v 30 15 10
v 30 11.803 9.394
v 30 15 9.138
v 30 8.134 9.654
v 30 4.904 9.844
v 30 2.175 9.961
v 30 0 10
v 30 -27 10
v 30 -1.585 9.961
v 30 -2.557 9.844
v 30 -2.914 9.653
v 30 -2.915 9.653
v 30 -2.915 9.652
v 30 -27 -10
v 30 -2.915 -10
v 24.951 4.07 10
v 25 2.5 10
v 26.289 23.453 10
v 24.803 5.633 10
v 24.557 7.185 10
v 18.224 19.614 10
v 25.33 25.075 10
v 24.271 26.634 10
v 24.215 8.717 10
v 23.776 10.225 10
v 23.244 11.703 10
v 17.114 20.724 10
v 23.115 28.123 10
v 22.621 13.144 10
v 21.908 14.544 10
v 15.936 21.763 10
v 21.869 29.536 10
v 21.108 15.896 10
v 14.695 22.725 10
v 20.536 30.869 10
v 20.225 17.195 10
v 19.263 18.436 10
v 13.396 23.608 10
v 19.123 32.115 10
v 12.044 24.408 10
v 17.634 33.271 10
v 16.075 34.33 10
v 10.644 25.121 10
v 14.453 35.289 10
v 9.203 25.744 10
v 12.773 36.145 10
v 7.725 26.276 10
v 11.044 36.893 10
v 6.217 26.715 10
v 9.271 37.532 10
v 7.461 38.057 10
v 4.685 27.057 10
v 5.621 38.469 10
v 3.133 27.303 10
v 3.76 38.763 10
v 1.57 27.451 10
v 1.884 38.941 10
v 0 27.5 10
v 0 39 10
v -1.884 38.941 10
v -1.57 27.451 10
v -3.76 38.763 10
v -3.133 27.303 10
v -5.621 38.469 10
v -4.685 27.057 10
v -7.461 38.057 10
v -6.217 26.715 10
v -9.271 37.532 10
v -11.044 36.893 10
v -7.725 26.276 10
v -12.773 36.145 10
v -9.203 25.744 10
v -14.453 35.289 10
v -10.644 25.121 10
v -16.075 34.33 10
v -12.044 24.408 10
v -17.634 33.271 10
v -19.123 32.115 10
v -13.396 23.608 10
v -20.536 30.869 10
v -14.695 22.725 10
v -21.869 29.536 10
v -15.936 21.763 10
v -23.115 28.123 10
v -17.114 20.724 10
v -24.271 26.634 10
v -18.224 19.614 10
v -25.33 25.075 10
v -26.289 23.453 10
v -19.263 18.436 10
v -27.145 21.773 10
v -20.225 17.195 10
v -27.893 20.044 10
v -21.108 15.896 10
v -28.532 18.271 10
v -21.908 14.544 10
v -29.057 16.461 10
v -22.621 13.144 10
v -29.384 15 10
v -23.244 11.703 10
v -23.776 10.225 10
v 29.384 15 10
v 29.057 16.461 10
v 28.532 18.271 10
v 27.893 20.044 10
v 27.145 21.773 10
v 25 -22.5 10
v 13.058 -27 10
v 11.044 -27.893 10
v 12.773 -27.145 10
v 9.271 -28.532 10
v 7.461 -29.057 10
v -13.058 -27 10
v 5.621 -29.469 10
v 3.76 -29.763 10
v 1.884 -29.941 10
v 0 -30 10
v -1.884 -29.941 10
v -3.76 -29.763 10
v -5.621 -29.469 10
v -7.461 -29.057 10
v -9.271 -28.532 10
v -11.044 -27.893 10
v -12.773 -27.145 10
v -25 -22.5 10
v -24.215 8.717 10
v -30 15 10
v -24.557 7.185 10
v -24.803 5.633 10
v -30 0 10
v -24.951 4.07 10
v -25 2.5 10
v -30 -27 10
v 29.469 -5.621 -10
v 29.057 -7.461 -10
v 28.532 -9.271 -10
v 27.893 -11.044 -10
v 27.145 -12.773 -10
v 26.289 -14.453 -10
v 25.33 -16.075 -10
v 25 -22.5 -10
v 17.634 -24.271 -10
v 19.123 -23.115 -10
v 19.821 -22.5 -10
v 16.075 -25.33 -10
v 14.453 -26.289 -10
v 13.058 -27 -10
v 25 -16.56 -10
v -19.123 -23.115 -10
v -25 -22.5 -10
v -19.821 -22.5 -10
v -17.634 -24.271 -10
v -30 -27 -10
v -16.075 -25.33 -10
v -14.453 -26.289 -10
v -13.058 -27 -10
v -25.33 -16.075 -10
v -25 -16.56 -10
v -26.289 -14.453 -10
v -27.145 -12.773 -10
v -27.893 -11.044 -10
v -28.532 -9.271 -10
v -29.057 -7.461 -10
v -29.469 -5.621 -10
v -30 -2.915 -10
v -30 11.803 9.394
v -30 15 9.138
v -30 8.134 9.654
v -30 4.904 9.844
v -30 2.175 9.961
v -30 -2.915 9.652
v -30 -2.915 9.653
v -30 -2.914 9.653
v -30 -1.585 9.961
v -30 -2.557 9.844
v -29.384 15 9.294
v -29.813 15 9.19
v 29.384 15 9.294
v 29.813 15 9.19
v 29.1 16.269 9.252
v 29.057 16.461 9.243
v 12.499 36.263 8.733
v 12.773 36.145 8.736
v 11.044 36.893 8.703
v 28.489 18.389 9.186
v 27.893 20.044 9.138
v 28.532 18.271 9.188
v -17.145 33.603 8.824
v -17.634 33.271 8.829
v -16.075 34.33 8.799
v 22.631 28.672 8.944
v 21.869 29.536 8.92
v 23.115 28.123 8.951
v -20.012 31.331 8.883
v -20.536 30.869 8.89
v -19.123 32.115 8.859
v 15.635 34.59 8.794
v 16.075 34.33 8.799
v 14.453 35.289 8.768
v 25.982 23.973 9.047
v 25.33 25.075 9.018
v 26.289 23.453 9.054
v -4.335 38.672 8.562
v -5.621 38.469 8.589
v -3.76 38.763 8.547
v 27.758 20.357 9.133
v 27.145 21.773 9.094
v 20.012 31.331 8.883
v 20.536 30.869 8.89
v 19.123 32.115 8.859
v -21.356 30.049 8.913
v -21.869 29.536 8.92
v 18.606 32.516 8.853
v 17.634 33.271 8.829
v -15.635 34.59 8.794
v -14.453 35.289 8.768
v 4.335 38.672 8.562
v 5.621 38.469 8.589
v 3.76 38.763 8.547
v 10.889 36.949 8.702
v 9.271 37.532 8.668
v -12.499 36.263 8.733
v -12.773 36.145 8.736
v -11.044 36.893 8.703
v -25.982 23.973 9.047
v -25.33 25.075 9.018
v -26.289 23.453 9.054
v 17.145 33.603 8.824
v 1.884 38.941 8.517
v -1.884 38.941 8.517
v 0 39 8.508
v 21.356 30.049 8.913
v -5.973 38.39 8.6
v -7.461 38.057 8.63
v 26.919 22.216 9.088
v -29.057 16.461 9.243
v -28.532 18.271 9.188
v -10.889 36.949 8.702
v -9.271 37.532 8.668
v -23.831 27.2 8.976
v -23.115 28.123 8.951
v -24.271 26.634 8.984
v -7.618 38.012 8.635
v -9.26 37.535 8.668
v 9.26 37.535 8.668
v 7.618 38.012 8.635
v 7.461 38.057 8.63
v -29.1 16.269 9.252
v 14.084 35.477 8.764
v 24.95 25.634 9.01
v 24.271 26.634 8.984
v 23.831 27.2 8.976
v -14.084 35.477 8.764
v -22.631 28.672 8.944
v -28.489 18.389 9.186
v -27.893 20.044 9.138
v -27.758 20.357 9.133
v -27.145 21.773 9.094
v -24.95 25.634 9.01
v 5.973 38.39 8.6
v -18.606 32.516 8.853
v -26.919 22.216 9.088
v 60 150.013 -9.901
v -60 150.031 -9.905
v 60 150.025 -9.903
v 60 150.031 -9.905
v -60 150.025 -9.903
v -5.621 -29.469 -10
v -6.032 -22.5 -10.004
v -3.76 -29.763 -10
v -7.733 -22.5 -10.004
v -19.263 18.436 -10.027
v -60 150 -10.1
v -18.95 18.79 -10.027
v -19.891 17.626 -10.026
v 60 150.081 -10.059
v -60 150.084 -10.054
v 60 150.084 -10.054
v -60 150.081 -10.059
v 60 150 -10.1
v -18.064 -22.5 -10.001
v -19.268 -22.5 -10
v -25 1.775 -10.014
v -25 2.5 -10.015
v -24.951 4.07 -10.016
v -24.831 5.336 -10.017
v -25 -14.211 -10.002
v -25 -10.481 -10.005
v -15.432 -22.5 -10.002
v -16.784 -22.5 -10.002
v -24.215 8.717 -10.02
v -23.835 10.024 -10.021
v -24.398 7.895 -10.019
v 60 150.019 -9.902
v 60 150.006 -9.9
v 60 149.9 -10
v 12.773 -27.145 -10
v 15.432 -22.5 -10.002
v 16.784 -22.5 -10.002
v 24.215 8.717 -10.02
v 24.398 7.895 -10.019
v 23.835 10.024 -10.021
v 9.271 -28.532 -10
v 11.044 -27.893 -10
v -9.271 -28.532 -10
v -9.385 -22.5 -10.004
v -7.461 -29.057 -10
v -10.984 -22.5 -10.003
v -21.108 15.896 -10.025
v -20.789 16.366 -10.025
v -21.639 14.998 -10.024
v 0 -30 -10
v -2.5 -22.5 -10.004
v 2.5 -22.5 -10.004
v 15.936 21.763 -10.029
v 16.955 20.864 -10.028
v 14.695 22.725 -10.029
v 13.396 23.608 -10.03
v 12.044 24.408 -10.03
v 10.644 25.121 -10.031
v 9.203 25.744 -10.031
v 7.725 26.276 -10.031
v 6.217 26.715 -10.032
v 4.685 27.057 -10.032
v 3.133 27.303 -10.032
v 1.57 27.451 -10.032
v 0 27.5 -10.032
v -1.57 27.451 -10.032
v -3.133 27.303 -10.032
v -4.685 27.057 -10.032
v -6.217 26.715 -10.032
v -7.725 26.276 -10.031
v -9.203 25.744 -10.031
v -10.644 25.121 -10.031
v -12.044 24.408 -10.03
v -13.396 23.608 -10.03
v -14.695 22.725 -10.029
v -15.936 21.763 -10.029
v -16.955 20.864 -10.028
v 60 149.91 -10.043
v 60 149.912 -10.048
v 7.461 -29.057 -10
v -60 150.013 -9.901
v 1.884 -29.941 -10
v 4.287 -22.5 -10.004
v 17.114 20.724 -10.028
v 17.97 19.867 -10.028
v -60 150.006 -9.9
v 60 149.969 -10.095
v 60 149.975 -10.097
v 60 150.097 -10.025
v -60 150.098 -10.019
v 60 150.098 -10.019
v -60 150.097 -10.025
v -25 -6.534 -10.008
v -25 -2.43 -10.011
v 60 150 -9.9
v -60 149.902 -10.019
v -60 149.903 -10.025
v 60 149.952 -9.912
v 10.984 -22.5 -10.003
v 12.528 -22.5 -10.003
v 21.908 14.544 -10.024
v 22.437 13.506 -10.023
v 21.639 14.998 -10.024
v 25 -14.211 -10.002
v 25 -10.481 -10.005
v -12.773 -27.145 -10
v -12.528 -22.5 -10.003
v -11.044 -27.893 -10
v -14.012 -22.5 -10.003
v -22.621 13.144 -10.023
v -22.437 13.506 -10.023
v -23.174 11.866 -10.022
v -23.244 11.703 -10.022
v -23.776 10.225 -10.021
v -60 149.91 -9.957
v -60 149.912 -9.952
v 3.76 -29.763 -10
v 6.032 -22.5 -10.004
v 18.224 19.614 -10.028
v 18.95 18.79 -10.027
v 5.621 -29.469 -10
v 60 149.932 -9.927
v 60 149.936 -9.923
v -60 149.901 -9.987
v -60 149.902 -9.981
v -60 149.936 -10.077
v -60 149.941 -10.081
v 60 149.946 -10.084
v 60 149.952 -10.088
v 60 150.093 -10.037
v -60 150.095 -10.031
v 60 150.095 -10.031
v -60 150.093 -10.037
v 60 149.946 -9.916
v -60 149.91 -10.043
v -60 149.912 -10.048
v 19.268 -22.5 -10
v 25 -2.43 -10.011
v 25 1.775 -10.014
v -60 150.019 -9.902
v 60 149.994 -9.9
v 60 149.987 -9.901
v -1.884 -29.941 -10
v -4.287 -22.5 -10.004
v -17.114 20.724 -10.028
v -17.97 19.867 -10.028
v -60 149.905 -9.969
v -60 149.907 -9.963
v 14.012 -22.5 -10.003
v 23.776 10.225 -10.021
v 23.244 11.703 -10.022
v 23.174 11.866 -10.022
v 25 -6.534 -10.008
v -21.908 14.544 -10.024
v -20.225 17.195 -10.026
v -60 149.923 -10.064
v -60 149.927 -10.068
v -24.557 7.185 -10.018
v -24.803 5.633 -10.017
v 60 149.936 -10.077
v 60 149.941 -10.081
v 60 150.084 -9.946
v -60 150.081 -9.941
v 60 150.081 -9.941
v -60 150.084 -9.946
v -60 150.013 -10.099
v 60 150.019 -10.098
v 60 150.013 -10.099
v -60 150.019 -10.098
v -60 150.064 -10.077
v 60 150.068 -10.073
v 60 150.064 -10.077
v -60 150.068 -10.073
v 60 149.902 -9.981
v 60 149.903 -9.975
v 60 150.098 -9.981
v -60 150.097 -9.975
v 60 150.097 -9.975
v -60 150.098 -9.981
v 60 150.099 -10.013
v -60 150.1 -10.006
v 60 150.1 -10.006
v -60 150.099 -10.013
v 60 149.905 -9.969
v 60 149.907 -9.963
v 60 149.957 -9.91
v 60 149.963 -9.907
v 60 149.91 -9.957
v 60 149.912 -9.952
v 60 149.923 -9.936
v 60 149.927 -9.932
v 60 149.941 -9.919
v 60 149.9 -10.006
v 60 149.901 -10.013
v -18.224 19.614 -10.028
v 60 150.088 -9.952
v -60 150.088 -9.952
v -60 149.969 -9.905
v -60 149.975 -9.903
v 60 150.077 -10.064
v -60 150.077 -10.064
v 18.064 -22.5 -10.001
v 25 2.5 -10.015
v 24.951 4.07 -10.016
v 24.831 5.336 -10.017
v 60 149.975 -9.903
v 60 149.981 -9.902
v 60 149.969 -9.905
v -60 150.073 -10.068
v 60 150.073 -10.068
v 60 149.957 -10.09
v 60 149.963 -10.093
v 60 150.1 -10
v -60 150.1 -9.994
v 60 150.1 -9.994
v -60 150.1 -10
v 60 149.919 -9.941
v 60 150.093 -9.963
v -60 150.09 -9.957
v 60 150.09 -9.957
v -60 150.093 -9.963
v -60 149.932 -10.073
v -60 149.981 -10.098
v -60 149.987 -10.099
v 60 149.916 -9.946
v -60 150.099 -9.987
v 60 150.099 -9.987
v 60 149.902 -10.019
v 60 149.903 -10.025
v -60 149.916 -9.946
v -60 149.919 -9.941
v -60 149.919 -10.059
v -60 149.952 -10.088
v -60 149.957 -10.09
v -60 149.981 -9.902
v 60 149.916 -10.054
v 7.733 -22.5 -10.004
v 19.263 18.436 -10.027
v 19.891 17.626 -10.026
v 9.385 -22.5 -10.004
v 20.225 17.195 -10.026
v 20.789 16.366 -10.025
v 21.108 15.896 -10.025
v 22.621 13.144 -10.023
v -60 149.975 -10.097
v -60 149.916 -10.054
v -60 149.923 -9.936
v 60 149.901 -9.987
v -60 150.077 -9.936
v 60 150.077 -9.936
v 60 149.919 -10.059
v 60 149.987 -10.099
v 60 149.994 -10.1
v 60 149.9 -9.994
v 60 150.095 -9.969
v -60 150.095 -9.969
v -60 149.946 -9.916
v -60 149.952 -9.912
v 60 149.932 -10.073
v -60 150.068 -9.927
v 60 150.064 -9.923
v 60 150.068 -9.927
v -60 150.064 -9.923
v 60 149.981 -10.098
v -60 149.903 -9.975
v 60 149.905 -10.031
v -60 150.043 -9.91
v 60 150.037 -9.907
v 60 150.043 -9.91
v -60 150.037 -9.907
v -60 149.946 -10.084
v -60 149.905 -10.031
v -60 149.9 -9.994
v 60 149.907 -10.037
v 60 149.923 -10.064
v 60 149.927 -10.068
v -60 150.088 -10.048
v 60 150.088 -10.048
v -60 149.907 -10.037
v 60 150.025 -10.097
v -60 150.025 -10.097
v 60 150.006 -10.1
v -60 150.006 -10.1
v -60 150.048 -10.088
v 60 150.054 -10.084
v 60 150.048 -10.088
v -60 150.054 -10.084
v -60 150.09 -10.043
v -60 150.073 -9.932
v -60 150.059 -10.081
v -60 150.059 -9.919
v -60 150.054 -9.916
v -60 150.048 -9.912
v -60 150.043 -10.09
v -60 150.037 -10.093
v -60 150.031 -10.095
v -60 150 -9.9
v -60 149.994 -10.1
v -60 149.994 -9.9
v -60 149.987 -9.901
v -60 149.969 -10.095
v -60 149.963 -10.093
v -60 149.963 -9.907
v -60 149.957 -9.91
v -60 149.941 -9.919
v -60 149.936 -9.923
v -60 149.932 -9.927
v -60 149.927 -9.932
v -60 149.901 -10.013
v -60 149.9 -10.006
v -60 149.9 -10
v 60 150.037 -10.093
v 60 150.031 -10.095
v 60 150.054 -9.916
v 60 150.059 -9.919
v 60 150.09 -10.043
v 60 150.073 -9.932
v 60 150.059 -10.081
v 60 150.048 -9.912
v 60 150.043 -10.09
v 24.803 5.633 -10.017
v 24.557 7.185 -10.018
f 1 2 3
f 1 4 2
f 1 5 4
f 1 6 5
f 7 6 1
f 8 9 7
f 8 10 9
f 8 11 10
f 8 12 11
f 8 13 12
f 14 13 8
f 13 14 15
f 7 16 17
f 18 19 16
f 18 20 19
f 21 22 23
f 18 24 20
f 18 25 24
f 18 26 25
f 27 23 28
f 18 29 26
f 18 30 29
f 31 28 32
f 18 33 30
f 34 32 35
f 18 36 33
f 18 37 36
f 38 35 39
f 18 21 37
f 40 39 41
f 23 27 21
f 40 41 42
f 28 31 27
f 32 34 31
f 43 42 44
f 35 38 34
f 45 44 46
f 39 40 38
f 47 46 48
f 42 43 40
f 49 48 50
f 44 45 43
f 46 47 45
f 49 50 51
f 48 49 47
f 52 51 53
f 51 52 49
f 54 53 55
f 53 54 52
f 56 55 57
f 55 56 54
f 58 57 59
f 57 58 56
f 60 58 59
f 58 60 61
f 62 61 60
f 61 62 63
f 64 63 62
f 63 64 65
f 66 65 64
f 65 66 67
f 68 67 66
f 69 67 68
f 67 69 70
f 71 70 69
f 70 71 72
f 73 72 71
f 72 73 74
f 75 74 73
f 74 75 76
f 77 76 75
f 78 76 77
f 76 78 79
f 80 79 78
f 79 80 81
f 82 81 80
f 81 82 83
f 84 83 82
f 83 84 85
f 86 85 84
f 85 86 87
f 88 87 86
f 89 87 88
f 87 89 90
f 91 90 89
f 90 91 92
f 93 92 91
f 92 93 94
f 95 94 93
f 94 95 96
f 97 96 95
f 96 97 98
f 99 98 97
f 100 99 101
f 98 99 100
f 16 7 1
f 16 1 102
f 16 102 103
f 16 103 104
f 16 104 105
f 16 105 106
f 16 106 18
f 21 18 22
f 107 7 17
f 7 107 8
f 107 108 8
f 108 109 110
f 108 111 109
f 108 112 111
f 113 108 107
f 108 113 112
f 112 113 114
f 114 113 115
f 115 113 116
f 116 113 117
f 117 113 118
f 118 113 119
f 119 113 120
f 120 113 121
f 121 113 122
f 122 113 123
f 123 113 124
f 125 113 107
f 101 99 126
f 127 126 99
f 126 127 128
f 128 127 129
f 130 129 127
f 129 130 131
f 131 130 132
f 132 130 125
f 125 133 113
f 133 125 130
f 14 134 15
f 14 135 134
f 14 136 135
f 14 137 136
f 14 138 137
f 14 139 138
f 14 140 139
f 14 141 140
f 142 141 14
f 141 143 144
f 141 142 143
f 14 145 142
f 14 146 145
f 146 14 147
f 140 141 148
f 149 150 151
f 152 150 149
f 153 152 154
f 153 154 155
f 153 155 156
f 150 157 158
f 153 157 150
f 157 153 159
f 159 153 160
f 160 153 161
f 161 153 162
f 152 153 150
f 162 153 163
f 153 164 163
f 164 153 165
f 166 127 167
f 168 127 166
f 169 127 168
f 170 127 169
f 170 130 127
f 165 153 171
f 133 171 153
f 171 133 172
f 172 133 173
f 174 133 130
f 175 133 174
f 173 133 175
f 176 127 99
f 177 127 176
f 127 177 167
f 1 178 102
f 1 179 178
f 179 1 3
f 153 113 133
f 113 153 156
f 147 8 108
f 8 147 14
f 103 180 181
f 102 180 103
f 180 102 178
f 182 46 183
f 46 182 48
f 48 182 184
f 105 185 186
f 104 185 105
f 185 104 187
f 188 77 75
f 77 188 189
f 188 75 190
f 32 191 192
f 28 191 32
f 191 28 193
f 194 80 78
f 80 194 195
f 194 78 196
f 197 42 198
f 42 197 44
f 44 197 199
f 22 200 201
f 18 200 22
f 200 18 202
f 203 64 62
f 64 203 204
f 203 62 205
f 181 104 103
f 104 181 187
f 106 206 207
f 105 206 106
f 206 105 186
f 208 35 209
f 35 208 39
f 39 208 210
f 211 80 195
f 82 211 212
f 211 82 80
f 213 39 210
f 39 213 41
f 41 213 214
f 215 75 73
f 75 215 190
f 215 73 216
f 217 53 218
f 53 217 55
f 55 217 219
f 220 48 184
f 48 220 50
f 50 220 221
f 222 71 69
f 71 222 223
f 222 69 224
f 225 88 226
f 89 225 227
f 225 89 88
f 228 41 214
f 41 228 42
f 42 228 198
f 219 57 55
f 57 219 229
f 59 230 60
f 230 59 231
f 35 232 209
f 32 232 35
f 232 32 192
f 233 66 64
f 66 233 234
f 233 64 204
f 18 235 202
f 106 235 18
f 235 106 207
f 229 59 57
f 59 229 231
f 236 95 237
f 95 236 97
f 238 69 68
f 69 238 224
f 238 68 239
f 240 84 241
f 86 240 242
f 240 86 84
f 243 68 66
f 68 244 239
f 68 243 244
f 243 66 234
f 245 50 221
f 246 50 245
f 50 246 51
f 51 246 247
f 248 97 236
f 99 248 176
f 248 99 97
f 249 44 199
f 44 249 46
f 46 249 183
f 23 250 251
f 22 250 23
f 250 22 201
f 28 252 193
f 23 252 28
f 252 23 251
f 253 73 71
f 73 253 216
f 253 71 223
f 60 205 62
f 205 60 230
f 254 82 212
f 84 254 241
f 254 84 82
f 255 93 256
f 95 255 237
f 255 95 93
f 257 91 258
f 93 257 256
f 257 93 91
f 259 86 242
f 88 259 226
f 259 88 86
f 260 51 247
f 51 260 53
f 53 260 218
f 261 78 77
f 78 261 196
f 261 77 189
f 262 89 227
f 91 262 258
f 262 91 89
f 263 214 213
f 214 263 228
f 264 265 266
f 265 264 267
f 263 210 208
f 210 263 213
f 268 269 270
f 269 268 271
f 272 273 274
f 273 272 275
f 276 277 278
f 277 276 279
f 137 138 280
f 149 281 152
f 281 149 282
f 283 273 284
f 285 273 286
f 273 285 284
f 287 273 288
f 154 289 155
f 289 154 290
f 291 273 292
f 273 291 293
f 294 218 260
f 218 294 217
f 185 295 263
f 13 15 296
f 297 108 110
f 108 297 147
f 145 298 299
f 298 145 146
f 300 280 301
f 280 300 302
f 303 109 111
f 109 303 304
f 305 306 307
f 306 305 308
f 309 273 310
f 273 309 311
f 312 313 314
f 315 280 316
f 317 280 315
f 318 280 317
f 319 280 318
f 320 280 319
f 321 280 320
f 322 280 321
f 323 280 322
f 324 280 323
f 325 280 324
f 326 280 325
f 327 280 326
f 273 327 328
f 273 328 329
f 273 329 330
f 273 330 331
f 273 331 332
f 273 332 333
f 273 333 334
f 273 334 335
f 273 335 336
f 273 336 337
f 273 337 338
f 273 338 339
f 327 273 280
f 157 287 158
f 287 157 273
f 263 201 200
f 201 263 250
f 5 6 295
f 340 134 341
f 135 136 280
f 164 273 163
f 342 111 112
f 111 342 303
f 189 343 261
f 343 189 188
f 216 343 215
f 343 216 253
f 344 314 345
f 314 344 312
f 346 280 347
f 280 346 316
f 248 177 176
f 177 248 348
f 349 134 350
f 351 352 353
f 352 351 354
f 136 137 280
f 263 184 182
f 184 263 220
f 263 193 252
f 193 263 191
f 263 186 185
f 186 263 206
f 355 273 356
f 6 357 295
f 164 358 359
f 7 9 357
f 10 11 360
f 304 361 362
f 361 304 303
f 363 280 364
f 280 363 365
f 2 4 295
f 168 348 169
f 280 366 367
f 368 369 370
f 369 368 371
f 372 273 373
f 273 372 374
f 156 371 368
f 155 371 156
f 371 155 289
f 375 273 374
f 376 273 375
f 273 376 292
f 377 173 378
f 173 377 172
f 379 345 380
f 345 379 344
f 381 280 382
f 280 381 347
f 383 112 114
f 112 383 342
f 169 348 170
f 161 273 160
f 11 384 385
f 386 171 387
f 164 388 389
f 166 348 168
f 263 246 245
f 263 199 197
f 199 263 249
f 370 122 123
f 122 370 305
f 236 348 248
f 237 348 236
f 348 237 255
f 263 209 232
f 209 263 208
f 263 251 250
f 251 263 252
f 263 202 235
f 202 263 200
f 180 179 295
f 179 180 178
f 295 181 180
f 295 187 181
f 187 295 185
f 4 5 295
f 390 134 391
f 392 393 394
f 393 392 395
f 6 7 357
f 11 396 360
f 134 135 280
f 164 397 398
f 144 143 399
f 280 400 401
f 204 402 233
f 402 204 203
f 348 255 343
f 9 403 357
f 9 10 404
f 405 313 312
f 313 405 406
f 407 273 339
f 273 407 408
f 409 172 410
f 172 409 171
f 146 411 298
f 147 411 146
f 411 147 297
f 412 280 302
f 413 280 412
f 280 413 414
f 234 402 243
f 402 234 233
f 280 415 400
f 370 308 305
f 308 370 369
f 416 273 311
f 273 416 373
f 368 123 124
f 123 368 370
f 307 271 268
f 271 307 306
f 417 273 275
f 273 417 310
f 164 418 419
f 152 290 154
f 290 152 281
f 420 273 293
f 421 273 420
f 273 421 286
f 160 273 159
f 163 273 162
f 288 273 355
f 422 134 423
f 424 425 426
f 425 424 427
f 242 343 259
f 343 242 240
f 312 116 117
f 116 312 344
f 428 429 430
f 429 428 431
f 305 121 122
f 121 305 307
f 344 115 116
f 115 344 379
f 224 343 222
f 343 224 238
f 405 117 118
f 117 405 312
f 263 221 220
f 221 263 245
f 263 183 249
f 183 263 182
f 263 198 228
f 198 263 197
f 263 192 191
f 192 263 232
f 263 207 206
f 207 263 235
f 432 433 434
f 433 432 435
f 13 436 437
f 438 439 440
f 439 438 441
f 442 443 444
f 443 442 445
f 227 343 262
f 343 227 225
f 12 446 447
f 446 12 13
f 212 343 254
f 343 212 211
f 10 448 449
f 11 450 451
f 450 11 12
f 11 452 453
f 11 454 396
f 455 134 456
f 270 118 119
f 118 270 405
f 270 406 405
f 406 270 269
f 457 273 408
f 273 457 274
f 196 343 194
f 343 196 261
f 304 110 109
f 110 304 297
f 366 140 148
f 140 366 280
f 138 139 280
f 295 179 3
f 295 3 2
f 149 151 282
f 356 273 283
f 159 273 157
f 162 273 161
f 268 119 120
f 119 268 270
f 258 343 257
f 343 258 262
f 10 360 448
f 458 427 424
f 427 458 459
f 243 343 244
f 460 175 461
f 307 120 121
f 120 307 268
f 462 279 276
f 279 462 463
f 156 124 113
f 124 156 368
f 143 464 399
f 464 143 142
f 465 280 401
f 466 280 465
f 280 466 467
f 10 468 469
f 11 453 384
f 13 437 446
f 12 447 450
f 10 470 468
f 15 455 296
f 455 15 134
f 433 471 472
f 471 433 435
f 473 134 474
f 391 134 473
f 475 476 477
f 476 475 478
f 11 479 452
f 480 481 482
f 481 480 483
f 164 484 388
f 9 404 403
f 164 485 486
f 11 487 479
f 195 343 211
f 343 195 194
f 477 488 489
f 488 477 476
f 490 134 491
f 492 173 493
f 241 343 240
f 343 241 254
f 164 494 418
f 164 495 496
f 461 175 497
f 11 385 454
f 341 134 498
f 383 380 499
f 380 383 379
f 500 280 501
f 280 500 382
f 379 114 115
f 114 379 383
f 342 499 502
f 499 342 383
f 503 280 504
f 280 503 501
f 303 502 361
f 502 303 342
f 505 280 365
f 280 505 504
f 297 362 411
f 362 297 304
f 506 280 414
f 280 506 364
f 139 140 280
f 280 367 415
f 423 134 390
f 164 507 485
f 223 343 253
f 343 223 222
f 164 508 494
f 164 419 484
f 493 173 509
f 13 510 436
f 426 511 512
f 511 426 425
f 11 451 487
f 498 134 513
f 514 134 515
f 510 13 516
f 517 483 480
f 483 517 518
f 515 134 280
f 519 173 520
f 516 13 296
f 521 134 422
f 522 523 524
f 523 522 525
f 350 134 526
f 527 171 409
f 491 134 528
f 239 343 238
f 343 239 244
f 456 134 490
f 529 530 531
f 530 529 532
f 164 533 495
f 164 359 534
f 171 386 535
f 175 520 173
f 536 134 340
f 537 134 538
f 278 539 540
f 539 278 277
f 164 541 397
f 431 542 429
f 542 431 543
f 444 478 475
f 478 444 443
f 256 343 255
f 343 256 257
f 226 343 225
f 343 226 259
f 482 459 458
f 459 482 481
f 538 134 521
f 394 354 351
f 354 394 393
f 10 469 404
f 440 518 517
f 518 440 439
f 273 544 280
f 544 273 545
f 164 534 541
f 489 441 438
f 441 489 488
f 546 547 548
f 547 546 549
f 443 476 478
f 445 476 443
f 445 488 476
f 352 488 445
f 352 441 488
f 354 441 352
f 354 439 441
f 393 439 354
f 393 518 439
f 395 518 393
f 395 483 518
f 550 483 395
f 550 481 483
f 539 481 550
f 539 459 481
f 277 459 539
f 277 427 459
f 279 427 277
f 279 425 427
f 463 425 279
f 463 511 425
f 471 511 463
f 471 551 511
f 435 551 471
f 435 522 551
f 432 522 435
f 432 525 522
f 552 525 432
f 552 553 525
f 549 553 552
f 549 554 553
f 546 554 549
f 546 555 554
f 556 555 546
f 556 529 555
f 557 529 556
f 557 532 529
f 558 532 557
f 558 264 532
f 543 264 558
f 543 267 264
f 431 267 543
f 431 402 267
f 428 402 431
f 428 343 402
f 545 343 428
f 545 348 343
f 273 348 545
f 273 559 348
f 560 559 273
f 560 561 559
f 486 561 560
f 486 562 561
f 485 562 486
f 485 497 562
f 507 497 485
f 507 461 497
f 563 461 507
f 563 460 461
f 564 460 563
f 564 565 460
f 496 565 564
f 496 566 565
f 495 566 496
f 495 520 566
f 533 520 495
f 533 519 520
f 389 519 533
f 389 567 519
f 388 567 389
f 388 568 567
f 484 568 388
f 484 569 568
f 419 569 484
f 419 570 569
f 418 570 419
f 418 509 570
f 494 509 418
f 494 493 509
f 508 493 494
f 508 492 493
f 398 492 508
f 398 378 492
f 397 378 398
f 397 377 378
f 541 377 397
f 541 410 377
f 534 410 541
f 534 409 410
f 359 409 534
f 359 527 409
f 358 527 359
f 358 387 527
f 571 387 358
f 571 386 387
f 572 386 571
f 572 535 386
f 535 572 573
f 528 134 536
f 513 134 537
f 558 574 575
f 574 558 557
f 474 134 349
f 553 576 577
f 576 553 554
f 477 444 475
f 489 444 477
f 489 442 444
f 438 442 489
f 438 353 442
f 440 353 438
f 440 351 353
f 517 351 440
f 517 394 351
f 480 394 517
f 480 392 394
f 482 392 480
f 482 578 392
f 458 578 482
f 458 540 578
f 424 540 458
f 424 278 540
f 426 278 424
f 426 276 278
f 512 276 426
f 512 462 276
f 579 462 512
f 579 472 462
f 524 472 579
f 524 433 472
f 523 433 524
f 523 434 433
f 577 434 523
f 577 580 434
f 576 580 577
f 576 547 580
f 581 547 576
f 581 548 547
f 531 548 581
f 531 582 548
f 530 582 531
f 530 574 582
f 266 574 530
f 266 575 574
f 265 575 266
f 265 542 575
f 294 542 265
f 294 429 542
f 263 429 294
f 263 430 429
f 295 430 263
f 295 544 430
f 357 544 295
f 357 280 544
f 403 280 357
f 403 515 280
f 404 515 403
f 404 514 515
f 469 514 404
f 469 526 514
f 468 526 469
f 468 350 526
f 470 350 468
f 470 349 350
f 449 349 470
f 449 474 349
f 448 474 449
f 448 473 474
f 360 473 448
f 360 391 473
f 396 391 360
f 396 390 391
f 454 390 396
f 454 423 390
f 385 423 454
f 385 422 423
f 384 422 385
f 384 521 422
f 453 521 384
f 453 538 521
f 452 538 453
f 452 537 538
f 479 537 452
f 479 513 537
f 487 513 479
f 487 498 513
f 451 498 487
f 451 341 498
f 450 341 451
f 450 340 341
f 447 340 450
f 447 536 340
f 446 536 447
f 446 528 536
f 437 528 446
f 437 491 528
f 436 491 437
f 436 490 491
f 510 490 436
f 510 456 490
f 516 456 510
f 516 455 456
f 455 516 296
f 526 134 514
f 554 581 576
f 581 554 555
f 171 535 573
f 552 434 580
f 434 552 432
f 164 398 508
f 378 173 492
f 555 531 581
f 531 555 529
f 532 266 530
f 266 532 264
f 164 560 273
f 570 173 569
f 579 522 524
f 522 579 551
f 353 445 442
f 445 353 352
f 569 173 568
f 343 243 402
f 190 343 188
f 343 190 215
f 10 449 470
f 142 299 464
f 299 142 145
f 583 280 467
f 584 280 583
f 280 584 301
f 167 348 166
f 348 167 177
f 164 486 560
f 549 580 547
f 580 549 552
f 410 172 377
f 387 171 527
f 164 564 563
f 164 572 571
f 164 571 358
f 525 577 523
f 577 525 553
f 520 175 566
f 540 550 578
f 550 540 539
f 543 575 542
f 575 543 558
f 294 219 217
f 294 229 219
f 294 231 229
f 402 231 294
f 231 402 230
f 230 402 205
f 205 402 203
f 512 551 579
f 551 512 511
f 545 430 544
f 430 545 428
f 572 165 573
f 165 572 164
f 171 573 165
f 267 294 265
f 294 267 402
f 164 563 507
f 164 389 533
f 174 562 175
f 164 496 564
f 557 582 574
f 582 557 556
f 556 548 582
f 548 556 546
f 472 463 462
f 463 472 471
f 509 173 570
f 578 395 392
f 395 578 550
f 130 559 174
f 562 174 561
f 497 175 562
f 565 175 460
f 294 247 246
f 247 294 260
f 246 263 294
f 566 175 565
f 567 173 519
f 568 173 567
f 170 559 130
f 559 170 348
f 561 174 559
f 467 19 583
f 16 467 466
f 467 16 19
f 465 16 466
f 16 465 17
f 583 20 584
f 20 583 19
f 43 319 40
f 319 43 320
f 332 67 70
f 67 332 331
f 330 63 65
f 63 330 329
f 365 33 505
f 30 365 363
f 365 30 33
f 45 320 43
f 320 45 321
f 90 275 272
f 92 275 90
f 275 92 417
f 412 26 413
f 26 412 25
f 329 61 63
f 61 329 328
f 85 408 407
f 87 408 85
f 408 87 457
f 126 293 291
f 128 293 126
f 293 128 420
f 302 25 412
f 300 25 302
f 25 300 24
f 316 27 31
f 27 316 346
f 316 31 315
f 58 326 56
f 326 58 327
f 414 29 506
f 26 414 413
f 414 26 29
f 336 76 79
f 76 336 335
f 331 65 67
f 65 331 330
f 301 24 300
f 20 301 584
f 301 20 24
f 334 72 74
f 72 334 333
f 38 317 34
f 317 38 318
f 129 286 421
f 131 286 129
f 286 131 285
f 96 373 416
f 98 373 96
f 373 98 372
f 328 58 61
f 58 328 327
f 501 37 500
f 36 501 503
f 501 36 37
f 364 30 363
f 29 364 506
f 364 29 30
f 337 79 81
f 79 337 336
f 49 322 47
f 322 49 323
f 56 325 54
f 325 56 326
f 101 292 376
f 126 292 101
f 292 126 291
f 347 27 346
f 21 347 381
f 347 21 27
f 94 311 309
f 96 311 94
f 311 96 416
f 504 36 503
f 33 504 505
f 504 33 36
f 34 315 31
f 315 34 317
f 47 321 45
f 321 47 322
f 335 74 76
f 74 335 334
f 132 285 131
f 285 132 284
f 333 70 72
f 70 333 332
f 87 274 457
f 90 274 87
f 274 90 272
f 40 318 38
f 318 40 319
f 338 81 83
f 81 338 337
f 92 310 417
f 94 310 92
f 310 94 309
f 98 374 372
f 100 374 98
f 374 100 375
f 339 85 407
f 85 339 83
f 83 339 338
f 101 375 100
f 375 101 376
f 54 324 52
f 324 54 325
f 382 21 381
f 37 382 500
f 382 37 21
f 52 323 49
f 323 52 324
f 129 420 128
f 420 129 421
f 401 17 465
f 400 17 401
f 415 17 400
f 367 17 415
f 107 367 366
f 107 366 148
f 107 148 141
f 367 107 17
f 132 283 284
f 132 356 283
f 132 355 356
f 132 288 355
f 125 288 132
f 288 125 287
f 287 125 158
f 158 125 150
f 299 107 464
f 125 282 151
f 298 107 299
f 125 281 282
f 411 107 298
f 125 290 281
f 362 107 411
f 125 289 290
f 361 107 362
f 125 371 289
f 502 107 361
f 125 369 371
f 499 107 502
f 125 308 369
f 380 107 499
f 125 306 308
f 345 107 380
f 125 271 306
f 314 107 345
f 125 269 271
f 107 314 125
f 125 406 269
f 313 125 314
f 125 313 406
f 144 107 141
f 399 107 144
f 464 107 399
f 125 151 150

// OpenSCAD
// [FL_INDEX: keywords="openscad, 3d_parametric, Libre_Hoe, csg_solid" | COT="Parametric OpenSCAD design from 3DCodeverse"]
// Title: Libre Hoe

// Customizable simple hoe head

//Customizer Variables

//axe head back
r= 60; //[1:200]

//resolution
n=100; //[1:200]

//hoe head height
h=20; //[1:500]

// handle hole radius
x=25; // 

//scale LENGTH OF HOE
s=150; //

// base blade thickness
b=30;//

// blade width
w=120;

l=50;

module chuck(){
	union(){
translate([0,-0.1*r,0])cube([r,0.7*r,h], center = true);
translate([0,0.3*r/2,0])cylinder(h = h, r1 = r/2, r2 = r/2, center = true, $fn=n);
}
}

module chunk(){
chuck();
hull(){
cylinder(h = h, r1 = b, r2 = b, center = true, $fn=n);
translate([0,s,-h/2])rotate([0,90,0])cylinder(h = w, r1 = 0.1, r2 = 0.1, center = true, $fn=n);
				}
}

module hoe(){
	difference(){
	chunk();	
	translate([0,x*.1,0])cylinder(h = h+l+1, r1 = x, r2 = x, center = true, $fn=n); //HANDLE HOL
	translate([-x,-x*.9,-h/2-1])cube([2*x, x,h+l+1,]); //SQUARE HANDLE HOLE
	}
					}
hoe();
